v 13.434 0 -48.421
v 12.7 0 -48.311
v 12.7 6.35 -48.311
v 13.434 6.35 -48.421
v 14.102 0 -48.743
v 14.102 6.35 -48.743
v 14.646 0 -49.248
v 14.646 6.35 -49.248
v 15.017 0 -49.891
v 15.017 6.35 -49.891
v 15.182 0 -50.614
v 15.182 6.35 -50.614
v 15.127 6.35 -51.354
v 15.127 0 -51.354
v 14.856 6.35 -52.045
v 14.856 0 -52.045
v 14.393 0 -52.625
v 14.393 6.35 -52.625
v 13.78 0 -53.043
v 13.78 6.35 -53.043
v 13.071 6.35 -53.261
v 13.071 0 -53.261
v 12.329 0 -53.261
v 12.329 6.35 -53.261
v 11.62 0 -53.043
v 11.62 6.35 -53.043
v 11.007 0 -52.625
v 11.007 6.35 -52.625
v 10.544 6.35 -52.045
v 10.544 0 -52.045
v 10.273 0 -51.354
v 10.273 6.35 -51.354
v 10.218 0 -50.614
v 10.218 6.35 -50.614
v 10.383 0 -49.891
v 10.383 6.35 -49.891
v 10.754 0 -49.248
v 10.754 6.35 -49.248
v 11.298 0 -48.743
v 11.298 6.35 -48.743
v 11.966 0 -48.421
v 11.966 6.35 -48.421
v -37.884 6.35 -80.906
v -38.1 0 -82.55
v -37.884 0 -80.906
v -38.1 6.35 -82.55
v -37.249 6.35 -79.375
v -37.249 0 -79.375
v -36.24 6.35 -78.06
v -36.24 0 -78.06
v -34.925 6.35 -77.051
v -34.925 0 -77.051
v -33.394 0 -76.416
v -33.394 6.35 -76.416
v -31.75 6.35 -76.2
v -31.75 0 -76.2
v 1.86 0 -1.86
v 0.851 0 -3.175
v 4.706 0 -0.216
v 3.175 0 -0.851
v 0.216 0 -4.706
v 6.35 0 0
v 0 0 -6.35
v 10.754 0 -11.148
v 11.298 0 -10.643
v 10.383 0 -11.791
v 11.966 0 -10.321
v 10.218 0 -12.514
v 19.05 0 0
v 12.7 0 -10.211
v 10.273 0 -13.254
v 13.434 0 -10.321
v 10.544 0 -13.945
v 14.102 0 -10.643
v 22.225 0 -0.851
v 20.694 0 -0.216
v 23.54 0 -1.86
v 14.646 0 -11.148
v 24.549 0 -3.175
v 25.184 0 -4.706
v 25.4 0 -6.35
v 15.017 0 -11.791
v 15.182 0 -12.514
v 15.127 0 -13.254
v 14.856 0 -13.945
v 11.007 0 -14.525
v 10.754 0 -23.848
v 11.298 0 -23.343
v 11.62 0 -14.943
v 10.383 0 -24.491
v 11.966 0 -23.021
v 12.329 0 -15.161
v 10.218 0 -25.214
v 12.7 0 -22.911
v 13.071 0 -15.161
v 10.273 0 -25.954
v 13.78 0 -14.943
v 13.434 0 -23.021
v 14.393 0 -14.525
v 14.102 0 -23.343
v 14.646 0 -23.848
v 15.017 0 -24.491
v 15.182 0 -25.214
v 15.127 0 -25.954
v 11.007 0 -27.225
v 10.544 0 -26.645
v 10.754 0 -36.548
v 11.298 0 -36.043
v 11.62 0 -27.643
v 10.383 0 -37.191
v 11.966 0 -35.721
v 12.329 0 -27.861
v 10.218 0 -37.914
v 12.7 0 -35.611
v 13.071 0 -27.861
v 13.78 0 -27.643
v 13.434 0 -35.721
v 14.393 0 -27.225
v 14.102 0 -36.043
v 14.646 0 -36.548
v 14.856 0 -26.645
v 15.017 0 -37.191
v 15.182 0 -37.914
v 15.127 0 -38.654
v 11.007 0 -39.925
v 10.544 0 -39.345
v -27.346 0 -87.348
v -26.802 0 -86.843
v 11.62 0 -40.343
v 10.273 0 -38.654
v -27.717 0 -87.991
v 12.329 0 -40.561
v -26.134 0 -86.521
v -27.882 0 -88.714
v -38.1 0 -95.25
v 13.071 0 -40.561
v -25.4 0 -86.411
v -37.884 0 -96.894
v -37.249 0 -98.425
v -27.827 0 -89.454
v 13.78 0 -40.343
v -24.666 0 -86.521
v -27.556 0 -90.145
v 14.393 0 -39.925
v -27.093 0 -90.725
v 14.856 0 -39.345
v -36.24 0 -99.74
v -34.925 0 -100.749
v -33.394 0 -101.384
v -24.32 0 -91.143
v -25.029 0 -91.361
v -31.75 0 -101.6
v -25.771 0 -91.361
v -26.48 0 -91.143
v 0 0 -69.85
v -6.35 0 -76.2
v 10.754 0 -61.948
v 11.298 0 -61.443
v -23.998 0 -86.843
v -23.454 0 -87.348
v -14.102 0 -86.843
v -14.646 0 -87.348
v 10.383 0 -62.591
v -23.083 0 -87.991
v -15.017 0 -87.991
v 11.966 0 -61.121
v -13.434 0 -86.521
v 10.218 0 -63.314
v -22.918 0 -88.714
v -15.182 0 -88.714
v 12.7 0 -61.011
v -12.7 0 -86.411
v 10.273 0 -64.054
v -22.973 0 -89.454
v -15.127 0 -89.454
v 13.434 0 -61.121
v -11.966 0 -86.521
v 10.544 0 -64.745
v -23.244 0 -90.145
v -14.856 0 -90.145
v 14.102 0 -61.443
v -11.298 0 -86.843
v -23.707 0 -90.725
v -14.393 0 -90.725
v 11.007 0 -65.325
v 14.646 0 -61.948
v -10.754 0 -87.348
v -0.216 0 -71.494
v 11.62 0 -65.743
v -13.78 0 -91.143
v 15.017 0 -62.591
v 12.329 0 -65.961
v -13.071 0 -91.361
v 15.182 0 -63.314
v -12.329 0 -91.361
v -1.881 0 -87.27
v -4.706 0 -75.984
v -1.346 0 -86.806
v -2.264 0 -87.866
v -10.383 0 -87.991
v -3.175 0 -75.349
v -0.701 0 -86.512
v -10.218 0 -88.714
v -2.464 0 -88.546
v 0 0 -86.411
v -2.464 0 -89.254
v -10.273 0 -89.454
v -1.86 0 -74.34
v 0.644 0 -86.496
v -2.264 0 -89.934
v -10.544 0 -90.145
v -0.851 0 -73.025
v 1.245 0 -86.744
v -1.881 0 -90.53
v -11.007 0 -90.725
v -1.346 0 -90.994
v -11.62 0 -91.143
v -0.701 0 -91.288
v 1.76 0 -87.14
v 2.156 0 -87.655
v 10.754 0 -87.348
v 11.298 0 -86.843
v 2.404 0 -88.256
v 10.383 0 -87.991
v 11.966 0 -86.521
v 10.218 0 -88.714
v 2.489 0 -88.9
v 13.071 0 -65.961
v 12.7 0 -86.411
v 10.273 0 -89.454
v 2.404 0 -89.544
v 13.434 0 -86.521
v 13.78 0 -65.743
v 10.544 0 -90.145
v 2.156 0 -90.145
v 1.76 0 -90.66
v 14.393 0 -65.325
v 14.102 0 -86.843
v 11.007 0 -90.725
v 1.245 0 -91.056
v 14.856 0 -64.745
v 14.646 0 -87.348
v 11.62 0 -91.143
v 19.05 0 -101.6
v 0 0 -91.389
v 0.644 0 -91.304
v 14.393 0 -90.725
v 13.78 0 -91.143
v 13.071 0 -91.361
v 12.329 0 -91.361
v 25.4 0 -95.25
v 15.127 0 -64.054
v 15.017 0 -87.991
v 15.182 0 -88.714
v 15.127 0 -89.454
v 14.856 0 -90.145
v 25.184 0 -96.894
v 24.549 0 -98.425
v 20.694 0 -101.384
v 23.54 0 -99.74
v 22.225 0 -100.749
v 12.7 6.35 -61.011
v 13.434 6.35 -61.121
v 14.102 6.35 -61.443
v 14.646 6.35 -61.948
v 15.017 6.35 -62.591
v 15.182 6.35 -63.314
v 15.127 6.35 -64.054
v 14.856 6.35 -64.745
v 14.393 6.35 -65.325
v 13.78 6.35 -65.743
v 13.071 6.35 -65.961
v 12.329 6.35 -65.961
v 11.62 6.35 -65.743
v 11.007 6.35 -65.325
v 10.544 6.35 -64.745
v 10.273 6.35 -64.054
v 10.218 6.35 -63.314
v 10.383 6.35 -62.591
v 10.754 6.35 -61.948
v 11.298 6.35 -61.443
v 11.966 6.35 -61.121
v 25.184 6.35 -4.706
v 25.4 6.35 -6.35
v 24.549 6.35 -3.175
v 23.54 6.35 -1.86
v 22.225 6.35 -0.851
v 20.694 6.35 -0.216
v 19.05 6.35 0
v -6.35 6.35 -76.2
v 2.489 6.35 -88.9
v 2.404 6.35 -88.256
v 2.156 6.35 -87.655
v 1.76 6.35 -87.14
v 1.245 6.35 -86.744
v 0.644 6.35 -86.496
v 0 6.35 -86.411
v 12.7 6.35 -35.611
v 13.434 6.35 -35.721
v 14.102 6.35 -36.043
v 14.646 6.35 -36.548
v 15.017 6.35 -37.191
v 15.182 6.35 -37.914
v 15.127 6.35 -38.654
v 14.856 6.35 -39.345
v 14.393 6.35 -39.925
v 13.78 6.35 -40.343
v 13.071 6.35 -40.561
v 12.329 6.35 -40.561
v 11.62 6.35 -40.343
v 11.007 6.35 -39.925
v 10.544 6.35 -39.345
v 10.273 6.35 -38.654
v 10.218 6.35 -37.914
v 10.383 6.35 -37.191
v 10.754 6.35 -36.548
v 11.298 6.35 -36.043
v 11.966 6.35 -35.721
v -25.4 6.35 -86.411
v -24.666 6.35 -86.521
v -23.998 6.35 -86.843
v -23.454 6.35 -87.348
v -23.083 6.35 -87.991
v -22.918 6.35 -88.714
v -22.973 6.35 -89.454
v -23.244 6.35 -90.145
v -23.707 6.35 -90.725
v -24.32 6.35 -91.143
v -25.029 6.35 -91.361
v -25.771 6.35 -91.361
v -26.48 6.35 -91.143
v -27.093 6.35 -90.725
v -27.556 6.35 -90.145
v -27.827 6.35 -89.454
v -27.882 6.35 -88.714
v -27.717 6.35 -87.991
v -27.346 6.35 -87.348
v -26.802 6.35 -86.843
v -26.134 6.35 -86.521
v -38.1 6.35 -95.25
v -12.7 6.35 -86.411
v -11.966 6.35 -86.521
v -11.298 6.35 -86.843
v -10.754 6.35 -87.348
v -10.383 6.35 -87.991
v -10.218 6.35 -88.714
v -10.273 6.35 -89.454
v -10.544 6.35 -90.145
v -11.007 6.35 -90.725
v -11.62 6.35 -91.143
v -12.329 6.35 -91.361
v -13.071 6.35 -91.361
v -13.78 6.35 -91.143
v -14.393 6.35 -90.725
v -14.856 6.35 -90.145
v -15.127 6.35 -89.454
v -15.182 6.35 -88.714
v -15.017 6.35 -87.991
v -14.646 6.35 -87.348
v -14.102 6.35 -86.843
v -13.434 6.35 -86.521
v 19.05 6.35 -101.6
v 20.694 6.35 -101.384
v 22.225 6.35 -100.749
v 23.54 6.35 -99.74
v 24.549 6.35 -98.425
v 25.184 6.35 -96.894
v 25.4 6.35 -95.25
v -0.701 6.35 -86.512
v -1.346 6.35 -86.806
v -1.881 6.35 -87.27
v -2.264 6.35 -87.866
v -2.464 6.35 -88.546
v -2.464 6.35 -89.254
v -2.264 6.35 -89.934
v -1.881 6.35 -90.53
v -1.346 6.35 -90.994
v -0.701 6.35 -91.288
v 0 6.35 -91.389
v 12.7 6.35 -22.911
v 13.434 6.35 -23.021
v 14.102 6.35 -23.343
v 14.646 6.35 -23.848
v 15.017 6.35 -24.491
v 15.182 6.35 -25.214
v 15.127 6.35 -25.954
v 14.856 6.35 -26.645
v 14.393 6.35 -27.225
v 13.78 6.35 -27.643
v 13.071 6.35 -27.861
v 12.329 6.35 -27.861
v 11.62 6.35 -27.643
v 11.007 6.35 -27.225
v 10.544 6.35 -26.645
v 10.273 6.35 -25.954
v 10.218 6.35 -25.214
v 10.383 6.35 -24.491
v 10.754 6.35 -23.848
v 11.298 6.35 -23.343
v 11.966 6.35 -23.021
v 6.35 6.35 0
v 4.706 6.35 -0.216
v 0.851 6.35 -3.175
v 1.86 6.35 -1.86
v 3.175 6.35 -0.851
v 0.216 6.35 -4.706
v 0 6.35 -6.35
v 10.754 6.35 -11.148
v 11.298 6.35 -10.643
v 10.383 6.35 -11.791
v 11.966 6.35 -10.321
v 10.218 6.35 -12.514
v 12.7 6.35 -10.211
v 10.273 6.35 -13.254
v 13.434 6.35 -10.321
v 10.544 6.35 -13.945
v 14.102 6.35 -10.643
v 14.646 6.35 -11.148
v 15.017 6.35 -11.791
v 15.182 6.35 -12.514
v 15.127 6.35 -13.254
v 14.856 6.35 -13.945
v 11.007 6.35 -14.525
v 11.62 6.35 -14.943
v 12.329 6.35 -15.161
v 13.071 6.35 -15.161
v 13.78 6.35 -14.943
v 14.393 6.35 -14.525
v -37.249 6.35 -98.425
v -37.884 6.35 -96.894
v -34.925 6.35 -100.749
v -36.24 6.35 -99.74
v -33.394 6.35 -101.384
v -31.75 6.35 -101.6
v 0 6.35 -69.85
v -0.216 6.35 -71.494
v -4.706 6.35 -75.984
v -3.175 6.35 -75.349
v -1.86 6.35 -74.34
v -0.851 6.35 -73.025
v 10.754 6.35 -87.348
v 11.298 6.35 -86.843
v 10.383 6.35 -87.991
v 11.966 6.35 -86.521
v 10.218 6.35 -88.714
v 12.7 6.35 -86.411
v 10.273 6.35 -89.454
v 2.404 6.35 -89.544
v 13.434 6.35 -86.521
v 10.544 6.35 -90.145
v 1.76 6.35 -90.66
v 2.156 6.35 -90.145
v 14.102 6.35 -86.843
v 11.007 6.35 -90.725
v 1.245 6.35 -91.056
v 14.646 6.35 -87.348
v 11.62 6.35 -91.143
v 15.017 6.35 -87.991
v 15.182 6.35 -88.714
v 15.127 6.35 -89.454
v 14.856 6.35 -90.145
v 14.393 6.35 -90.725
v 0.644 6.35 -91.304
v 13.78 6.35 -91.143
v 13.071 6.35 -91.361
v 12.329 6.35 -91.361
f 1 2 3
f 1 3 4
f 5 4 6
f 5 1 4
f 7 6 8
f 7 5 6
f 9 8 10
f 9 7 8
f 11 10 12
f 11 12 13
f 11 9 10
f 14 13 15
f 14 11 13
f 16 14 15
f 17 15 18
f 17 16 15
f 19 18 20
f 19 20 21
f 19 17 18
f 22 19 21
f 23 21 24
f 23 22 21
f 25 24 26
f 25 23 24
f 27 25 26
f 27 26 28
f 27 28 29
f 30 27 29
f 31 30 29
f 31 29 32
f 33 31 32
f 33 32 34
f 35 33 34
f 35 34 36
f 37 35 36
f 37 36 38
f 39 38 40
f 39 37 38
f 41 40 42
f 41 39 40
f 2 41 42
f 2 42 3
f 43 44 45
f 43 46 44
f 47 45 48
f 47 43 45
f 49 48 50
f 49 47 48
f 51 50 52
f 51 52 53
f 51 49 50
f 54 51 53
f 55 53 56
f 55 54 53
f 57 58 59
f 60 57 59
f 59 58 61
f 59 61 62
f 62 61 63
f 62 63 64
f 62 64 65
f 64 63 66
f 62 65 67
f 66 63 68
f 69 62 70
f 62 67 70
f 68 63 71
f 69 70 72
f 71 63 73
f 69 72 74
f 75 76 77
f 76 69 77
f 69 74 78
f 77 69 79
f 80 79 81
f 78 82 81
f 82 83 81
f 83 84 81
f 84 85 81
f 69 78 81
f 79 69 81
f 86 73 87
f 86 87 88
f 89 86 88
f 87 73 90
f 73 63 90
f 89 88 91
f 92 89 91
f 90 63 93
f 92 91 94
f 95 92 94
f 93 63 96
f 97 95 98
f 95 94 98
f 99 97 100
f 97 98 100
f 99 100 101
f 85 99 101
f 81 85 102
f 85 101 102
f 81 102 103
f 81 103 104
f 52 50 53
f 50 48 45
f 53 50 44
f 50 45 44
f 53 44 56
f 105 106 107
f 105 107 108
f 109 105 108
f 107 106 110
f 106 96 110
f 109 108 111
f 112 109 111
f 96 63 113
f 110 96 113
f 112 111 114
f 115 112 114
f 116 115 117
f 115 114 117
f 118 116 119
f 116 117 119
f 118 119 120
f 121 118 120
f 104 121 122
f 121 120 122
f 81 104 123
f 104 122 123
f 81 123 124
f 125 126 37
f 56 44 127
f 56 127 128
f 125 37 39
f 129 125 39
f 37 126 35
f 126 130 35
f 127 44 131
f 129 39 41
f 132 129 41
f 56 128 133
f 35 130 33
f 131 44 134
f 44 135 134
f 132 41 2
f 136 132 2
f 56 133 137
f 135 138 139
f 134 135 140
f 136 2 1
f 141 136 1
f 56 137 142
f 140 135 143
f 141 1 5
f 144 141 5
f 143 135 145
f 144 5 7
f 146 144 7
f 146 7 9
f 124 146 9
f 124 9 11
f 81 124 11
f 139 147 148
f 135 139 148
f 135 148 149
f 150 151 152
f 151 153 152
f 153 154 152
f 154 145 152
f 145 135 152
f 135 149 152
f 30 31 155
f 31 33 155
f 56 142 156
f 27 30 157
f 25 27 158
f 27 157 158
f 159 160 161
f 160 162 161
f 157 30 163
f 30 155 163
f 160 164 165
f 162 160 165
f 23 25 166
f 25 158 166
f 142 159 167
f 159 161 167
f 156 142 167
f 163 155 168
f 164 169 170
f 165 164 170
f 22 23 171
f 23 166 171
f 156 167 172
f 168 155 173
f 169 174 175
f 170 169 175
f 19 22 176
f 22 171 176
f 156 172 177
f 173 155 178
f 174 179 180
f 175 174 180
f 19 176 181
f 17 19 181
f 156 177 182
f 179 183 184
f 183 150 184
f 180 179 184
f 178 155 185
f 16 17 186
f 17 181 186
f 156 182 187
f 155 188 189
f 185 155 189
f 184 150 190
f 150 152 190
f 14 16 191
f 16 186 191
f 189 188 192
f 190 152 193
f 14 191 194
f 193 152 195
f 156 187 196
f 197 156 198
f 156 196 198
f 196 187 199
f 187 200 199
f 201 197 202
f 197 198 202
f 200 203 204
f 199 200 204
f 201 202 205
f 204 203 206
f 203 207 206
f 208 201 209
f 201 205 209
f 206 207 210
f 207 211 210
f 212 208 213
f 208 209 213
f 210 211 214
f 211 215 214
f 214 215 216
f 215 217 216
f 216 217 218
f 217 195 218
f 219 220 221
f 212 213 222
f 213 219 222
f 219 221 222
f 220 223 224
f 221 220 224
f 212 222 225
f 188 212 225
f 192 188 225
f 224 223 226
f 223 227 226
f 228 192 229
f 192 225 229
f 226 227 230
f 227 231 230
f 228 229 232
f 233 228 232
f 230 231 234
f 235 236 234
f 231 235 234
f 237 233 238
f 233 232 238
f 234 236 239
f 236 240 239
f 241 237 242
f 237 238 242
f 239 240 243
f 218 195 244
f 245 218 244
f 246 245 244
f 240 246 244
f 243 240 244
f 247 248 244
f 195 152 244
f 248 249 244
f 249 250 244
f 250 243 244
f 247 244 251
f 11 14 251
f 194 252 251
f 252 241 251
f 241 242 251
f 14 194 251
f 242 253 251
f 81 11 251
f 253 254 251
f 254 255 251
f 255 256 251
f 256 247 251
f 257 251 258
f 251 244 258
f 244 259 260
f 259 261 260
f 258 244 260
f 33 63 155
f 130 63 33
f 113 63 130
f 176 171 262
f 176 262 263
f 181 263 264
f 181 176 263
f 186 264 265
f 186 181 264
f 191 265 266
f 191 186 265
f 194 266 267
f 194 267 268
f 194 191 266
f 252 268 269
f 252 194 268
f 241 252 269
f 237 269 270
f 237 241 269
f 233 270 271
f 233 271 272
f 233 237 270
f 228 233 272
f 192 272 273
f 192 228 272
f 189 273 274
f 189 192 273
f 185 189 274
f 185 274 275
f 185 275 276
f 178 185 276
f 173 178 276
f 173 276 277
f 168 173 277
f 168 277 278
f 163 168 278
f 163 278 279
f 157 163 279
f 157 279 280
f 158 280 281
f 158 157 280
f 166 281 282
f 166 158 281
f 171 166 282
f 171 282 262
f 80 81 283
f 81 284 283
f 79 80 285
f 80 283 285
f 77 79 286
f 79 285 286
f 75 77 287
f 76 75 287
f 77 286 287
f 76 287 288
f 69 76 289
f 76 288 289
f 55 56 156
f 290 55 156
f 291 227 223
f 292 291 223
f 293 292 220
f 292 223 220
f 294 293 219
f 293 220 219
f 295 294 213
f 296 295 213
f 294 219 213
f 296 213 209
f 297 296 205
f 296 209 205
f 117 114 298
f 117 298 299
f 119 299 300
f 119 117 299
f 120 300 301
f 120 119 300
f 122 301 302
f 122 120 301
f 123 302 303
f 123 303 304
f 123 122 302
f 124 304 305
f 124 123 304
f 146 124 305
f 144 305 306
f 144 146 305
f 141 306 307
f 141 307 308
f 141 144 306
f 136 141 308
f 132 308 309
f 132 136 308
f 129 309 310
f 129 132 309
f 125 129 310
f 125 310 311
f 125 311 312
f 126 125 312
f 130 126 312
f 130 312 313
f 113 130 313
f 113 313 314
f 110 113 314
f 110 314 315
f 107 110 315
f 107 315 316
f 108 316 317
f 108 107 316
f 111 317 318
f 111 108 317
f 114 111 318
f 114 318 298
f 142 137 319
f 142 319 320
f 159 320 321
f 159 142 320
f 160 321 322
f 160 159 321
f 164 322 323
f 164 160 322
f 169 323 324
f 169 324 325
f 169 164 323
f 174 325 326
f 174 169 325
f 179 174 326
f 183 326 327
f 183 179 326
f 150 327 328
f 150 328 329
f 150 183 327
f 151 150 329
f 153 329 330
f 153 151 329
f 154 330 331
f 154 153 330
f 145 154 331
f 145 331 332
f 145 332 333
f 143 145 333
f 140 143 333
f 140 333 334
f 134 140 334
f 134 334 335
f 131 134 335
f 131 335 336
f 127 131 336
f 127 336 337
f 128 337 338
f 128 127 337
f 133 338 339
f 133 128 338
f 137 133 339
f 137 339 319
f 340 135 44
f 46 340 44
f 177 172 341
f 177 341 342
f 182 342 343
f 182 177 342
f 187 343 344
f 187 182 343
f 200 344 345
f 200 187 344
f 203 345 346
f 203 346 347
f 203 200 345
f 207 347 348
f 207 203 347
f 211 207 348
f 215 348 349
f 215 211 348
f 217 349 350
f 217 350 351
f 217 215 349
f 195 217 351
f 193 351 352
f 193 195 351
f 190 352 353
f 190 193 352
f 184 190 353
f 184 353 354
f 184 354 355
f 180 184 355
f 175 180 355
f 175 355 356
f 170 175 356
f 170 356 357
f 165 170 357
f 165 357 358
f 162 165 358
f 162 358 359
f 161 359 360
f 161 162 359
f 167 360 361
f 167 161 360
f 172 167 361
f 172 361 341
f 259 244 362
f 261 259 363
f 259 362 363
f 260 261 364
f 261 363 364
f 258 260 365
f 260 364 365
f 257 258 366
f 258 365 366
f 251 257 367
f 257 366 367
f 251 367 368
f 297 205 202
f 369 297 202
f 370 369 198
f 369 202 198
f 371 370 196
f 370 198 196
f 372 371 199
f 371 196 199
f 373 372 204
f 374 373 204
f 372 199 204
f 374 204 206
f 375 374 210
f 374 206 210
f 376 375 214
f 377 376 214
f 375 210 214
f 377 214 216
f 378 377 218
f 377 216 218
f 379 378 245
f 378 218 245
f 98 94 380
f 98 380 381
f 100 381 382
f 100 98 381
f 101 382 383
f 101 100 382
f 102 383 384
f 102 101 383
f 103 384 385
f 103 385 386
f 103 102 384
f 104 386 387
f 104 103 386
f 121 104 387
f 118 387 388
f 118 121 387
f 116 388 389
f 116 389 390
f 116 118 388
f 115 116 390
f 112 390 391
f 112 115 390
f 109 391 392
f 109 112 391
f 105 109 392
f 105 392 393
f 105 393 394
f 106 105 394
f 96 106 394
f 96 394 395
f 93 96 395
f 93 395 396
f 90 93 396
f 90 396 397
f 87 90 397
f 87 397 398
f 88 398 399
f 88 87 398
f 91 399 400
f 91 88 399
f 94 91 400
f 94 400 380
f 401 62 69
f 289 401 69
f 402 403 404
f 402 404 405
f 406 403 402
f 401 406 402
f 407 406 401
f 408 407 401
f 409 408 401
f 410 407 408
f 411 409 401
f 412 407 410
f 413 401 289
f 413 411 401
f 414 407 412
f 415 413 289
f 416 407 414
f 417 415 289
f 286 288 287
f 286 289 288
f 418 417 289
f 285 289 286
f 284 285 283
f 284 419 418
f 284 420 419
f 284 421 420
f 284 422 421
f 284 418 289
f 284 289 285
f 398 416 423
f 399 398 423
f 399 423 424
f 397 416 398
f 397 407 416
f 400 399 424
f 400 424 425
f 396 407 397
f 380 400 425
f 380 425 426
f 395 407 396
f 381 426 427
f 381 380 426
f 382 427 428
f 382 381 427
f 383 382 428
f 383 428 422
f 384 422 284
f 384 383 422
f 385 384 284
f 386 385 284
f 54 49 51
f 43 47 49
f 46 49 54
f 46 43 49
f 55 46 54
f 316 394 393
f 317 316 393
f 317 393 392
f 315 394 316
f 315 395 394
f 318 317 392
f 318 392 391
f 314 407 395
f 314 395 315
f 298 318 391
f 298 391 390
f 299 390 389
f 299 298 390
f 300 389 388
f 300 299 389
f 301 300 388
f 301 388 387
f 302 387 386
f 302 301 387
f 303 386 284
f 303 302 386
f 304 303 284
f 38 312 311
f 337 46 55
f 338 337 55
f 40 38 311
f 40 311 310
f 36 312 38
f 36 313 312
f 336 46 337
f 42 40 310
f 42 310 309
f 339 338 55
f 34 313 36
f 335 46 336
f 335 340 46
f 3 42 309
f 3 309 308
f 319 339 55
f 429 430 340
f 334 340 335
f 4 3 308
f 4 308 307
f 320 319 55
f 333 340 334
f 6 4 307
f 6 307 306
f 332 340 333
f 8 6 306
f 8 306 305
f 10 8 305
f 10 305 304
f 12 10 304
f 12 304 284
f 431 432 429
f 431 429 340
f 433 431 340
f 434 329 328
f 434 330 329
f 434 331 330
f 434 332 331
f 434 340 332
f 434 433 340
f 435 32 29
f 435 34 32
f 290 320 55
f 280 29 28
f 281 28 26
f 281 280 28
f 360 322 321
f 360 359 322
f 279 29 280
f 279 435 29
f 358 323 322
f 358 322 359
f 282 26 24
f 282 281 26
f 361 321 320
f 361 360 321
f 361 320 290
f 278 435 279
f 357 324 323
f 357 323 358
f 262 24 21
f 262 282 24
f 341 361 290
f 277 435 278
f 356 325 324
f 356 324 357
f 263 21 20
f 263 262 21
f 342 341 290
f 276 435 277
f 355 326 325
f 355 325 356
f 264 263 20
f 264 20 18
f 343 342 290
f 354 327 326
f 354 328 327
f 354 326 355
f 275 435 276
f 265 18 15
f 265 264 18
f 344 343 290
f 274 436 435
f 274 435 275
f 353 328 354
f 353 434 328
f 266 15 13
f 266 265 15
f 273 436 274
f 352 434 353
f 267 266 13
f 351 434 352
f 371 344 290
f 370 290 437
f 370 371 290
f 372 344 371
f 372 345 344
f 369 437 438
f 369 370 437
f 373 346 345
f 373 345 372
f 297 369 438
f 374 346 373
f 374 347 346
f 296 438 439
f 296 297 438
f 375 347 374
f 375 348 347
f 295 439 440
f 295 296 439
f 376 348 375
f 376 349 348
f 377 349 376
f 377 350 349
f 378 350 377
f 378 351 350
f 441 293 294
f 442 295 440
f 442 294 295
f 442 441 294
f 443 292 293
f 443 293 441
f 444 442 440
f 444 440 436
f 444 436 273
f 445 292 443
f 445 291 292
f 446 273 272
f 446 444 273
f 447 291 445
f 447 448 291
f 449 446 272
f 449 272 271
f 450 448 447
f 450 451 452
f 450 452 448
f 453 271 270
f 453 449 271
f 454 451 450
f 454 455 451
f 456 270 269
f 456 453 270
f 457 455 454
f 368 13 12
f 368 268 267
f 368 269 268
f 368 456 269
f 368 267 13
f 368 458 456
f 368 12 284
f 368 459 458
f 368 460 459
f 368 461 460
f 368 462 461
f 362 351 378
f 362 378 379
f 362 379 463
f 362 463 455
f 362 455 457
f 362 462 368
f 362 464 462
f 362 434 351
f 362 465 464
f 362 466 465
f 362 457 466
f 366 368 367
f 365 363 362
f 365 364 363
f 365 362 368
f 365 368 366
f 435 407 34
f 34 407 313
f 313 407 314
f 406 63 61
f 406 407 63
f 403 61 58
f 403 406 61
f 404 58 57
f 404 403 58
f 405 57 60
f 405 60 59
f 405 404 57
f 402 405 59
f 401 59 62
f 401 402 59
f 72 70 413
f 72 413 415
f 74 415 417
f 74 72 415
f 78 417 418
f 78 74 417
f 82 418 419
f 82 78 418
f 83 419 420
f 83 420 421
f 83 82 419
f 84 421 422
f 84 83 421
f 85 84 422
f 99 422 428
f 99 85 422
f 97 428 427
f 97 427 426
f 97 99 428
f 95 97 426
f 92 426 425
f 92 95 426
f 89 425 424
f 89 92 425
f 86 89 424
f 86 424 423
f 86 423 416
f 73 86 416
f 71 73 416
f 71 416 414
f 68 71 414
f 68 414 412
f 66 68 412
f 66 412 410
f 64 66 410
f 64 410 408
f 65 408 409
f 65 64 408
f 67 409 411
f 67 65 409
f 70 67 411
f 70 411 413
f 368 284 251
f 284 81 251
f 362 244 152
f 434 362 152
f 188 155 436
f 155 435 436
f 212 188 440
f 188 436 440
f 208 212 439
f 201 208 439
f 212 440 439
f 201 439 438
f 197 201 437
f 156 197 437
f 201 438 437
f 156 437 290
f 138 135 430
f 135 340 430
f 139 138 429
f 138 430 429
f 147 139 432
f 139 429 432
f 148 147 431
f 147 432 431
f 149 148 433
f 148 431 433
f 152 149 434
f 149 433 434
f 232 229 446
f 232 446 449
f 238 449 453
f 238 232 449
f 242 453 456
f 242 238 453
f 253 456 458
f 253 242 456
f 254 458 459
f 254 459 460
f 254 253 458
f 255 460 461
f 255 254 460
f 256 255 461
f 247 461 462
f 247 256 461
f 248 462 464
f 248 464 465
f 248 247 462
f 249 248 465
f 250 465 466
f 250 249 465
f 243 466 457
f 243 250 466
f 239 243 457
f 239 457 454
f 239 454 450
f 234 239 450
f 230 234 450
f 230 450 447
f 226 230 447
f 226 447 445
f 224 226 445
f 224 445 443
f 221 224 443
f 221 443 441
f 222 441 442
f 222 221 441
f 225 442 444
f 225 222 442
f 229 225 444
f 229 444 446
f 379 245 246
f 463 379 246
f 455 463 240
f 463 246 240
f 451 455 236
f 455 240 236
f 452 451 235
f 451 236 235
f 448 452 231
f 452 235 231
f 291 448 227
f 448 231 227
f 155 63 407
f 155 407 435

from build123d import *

# Parameters (mm, degrees)
SKETCH1_R           = 2.4892
SKETCH1_W           = 25.4
SKETCH1_H           = 76.2
BOSS_EXTRUDE1_DEPTH = 6.35
FILLET1_R           = 6.35


with BuildPart() as part:
    # Sketch1 → Boss-Extrude1 (new body)
    # profile 1 of 3: a face of its own
    with BuildSketch(Plane(origin=(0, 0, 0), x_dir=(1, 0, 0), z_dir=(0, 1, 0))):
        with BuildLine():
            Line((-38.1, 76.2), (0, 76.2))
            Line((0, 76.2), (0, 86.4108))
            ThreePointArc((0, 86.4108), (-2.4892, 88.9), (0, 91.3892))
            Line((0, 91.3892), (0, 101.6))
            Line((0, 101.6), (-38.1, 101.6))
            Line((-38.1, 101.6), (-38.1, 76.2))
        make_face()
        with Locations(Location((-25.4, 88.9, 0), (0, 0, 270))):
            Circle(SKETCH1_R, mode=Mode.SUBTRACT)
        with Locations(Location((-12.7, 88.9, 0), (0, 0, 270))):
            Circle(SKETCH1_R, mode=Mode.SUBTRACT)
    # profile 2 of 3: a face of its own
    with BuildSketch(Plane(origin=(0, 0, 0), x_dir=(1, 0, 0), z_dir=(0, 1, 0))):
        with BuildLine():
            Line((0, 86.4108), (0, 76.2))
            Line((0, 76.2), (25.4, 76.2))
            Line((25.4, 76.2), (25.4, 101.6))
            Line((25.4, 101.6), (0, 101.6))
            Line((0, 101.6), (0, 91.3892))
            ThreePointArc((0, 91.3892), (1.7601302, 90.6601302), (2.4892, 88.9))
            ThreePointArc((2.4892, 88.9), (1.7601302, 87.1398698), (0, 86.4108))
        make_face()
        with Locations(Location((12.7, 88.9, 0), (0, 0, 270))):
            Circle(SKETCH1_R, mode=Mode.SUBTRACT)
    # profile 3 of 3: a face of its own
    with BuildSketch(Plane(origin=(0, 0, 0), x_dir=(1, 0, 0), z_dir=(0, 1, 0))):
        with Locations((12.7, 38.1)):
            Rectangle(SKETCH1_W, SKETCH1_H)
        with Locations(Location((12.7, 12.7, 0), (0, 0, 270))):
            Circle(SKETCH1_R, mode=Mode.SUBTRACT)
        with Locations(Location((12.7, 25.4, 0), (0, 0, 270))):
            Circle(SKETCH1_R, mode=Mode.SUBTRACT)
        with Locations(Location((12.7, 38.1, 0), (0, 0, 270))):
            Circle(SKETCH1_R, mode=Mode.SUBTRACT)
        with Locations(Location((12.7, 50.8, 0), (0, 0, 270))):
            Circle(SKETCH1_R, mode=Mode.SUBTRACT)
        with Locations(Location((12.7, 63.5, 0), (0, 0, 270))):
            Circle(SKETCH1_R, mode=Mode.SUBTRACT)
    extrude(amount=BOSS_EXTRUDE1_DEPTH)

    # Fillet1
    fillet1_edges = [part.edges().sort_by_distance(p)[0] for p in [
        (25.4, 3.175, 0),
        (0, 3.175, 0),
        (0, 3.175, -76.2),
        (-38.1, 3.175, -76.2),
        (-38.1, 3.175, -101.6),
        (25.4, 3.175, -101.6),
    ]]
    fillet(fillet1_edges, radius=FILLET1_R)


solid = part.part
